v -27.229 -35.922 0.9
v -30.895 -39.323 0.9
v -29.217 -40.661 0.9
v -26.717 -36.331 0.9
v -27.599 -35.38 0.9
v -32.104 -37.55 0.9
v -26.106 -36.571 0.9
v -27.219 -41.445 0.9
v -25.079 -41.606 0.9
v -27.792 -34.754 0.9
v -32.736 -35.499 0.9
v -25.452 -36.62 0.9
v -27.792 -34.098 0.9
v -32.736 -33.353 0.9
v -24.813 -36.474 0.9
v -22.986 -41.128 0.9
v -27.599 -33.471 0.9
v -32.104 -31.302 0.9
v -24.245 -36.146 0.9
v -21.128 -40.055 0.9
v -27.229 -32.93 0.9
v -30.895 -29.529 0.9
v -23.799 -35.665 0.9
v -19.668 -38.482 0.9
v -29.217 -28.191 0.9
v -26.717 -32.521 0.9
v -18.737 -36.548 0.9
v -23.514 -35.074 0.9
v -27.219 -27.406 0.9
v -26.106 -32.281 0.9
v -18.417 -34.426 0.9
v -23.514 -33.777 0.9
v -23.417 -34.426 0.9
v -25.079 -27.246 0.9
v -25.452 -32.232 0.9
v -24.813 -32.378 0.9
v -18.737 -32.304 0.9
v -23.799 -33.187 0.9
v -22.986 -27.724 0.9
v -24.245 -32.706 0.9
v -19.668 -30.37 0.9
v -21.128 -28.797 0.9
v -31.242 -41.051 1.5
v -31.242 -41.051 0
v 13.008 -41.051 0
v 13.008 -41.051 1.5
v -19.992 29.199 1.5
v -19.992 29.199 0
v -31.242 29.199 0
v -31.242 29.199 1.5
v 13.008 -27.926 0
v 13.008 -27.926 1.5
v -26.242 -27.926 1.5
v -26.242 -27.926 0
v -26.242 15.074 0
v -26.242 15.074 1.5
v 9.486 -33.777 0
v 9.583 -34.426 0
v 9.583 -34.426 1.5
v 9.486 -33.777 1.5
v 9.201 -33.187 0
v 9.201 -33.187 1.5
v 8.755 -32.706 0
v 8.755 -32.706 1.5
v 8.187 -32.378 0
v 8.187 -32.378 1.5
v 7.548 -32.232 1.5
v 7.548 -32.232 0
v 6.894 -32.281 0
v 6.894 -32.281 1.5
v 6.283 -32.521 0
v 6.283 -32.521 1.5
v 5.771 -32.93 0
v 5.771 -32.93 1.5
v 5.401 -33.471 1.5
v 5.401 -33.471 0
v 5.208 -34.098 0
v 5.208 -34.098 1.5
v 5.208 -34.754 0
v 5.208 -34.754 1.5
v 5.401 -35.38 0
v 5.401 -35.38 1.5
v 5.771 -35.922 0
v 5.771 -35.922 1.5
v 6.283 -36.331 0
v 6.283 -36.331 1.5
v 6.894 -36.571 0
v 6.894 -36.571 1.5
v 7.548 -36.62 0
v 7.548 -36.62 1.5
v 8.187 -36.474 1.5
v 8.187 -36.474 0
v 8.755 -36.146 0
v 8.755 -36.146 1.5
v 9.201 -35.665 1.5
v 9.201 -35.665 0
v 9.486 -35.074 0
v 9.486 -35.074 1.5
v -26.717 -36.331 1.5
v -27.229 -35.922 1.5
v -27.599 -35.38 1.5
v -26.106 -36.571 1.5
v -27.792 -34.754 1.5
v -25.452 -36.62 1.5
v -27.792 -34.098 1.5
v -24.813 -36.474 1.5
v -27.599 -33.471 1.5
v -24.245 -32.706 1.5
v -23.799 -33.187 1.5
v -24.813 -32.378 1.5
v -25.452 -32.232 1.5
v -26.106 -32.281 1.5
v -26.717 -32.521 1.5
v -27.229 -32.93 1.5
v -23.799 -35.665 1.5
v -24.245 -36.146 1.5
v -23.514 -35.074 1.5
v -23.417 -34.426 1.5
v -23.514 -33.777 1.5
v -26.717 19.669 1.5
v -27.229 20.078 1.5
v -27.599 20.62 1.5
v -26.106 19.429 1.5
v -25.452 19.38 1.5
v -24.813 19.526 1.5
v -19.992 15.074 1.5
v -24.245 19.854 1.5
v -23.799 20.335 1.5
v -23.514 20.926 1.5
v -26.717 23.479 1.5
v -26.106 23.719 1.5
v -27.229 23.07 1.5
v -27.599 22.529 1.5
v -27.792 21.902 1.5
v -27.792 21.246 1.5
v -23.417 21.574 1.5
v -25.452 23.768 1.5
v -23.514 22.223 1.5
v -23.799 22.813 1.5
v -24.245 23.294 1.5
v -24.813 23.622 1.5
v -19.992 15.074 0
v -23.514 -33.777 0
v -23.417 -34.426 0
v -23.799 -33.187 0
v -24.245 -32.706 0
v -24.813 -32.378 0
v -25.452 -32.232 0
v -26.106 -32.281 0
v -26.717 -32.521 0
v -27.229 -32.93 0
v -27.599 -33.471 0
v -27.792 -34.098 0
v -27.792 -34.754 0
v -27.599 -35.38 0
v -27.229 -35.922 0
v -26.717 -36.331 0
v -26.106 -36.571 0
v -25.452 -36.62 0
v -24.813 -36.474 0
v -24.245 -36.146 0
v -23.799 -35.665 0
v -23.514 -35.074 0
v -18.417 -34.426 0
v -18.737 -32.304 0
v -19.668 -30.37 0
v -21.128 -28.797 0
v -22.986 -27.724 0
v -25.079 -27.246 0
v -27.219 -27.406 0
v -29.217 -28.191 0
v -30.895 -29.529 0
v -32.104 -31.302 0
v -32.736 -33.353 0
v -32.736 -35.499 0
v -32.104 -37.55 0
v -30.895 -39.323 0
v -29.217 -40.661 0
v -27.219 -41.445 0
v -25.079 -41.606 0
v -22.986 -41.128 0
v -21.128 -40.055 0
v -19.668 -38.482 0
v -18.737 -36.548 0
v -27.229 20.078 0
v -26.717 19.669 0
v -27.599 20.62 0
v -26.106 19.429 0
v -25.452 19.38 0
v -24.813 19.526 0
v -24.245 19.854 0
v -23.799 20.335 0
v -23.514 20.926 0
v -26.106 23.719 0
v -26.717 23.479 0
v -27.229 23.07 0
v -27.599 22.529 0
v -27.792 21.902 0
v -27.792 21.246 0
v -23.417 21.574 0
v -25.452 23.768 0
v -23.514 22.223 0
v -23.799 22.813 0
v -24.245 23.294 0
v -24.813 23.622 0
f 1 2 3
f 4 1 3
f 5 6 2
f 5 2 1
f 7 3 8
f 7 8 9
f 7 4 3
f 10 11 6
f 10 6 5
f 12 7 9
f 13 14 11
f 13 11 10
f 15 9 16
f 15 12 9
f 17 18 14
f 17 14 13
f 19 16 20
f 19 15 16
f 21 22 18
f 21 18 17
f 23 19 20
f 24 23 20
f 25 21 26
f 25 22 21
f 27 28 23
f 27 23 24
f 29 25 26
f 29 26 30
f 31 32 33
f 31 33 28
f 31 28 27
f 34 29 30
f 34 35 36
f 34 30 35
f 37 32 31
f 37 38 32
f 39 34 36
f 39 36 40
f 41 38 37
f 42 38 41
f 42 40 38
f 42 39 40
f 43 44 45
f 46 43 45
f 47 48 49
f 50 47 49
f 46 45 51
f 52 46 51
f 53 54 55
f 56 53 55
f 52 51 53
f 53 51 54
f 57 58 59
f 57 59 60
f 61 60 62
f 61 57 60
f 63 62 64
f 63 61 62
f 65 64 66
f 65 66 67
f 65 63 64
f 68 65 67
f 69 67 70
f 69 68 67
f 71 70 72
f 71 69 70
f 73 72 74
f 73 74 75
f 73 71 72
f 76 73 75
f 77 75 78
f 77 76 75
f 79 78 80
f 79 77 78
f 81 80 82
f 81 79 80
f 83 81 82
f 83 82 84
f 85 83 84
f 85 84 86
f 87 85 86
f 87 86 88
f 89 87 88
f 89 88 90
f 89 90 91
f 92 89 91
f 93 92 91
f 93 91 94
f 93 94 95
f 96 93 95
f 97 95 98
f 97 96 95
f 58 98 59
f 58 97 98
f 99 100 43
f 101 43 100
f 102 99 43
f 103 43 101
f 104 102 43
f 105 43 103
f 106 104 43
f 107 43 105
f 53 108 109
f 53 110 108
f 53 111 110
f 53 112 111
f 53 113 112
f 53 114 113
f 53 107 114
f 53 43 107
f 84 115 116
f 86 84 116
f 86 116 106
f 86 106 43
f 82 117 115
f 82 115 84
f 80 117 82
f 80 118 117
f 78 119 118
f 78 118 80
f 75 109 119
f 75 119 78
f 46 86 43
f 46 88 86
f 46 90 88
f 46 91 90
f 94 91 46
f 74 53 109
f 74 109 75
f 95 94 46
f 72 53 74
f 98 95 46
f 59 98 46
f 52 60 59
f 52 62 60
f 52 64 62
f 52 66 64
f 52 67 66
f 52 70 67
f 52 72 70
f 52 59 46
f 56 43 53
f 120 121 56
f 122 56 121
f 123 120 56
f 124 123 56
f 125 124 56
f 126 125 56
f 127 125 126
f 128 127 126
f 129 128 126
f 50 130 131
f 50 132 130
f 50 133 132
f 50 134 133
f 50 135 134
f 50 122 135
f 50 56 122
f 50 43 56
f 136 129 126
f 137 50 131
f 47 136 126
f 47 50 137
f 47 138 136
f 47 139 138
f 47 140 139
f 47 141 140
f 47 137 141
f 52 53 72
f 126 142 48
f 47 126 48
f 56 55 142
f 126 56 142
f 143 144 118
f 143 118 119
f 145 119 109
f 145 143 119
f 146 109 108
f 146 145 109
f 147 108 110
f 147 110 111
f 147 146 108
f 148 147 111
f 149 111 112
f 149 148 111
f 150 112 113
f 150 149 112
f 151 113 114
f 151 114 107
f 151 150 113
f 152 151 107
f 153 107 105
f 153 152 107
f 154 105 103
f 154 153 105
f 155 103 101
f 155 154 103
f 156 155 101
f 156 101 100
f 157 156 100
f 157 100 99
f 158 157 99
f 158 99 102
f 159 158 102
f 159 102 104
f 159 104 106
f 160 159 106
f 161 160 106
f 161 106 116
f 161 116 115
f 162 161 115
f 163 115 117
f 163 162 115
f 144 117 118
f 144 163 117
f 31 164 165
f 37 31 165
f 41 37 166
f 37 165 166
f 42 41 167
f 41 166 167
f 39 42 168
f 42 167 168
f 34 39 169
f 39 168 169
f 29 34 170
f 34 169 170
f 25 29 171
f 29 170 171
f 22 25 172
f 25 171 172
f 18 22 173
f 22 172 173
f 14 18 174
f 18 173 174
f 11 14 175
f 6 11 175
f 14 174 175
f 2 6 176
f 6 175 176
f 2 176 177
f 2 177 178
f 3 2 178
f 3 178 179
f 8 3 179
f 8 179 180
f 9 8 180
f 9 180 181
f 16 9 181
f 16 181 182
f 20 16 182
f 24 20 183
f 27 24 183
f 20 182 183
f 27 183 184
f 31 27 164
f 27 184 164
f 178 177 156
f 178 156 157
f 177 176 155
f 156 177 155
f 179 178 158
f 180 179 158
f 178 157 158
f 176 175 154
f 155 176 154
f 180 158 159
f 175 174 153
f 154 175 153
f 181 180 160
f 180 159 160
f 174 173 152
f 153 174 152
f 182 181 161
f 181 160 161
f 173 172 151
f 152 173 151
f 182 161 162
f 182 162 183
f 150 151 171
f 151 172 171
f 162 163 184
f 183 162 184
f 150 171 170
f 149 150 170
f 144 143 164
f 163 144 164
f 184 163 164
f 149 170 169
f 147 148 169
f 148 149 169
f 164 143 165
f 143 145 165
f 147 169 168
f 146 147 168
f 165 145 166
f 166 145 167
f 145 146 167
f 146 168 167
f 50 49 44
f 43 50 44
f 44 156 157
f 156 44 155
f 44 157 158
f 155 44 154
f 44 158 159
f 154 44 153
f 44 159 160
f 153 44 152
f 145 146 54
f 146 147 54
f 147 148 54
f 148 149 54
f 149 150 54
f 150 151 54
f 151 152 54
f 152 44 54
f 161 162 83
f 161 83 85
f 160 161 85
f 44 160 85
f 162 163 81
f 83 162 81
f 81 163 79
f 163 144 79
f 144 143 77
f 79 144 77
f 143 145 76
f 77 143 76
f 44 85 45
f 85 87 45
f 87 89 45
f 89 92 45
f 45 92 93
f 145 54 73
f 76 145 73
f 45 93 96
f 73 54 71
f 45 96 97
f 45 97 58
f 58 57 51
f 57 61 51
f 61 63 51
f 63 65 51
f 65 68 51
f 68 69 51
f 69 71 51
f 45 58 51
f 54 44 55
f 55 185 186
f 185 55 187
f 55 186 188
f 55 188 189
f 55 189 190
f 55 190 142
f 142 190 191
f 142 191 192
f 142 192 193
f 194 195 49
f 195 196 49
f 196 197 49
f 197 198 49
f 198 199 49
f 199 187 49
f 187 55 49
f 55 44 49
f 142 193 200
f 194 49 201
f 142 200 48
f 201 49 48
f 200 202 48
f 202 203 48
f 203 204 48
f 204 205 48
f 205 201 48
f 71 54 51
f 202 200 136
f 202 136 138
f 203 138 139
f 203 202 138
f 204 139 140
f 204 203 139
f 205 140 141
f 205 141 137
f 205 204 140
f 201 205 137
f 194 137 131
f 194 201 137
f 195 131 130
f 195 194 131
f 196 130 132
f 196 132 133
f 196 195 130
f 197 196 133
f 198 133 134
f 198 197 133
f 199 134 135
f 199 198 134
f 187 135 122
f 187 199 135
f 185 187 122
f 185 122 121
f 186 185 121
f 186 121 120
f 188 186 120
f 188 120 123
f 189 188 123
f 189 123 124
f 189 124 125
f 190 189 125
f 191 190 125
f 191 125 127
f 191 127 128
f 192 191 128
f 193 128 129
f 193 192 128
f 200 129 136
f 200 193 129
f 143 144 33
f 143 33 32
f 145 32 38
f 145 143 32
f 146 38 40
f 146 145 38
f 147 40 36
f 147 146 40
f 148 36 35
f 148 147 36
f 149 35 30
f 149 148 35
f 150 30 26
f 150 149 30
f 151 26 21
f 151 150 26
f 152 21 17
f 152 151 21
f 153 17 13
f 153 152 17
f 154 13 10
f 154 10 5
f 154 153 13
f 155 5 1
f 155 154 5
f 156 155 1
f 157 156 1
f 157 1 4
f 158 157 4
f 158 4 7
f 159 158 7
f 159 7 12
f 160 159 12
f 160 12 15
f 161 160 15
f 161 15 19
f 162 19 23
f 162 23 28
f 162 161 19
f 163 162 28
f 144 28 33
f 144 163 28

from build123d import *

# Parameters (mm, degrees)
F0_R     = 2.2
F1_DEPTH = 1.5
F2_R     = 7.2
F2_R_2   = 2.2
F3_DEPTH = 0.9


with BuildPart() as f1:
    # F0 (on Top) → F1 (new body)
    with BuildSketch(Plane.XY):
        Polygon((-19.991683, 29.199099), (-31.241683, 29.199099), (-31.241683, -41.050901), (13.008317, -41.050901), (13.008317, -27.925901), (-26.241683, -27.925901), (-26.241683, 15.074099), (-19.991683, 15.074099), align=None)
        with Locations((-25.616683, -34.425901)):
            Circle(F0_R, mode=Mode.SUBTRACT)
        with Locations((7.383317, -34.425901)):
            Circle(F0_R, mode=Mode.SUBTRACT)
        with Locations((-25.616683, 21.574099)):
            Circle(F0_R, mode=Mode.SUBTRACT)
    extrude(amount=F1_DEPTH)


with BuildPart() as f3:
    # F2 (on Top) → F3 (new body)
    with BuildSketch(Plane.XY):
        with Locations((-25.616683, -34.425901)):
            Circle(F2_R)
        with Locations((-25.616683, -34.425901)):
            Circle(F2_R_2, mode=Mode.SUBTRACT)
    extrude(amount=F3_DEPTH)


solid = Compound([f1.part, f3.part])
